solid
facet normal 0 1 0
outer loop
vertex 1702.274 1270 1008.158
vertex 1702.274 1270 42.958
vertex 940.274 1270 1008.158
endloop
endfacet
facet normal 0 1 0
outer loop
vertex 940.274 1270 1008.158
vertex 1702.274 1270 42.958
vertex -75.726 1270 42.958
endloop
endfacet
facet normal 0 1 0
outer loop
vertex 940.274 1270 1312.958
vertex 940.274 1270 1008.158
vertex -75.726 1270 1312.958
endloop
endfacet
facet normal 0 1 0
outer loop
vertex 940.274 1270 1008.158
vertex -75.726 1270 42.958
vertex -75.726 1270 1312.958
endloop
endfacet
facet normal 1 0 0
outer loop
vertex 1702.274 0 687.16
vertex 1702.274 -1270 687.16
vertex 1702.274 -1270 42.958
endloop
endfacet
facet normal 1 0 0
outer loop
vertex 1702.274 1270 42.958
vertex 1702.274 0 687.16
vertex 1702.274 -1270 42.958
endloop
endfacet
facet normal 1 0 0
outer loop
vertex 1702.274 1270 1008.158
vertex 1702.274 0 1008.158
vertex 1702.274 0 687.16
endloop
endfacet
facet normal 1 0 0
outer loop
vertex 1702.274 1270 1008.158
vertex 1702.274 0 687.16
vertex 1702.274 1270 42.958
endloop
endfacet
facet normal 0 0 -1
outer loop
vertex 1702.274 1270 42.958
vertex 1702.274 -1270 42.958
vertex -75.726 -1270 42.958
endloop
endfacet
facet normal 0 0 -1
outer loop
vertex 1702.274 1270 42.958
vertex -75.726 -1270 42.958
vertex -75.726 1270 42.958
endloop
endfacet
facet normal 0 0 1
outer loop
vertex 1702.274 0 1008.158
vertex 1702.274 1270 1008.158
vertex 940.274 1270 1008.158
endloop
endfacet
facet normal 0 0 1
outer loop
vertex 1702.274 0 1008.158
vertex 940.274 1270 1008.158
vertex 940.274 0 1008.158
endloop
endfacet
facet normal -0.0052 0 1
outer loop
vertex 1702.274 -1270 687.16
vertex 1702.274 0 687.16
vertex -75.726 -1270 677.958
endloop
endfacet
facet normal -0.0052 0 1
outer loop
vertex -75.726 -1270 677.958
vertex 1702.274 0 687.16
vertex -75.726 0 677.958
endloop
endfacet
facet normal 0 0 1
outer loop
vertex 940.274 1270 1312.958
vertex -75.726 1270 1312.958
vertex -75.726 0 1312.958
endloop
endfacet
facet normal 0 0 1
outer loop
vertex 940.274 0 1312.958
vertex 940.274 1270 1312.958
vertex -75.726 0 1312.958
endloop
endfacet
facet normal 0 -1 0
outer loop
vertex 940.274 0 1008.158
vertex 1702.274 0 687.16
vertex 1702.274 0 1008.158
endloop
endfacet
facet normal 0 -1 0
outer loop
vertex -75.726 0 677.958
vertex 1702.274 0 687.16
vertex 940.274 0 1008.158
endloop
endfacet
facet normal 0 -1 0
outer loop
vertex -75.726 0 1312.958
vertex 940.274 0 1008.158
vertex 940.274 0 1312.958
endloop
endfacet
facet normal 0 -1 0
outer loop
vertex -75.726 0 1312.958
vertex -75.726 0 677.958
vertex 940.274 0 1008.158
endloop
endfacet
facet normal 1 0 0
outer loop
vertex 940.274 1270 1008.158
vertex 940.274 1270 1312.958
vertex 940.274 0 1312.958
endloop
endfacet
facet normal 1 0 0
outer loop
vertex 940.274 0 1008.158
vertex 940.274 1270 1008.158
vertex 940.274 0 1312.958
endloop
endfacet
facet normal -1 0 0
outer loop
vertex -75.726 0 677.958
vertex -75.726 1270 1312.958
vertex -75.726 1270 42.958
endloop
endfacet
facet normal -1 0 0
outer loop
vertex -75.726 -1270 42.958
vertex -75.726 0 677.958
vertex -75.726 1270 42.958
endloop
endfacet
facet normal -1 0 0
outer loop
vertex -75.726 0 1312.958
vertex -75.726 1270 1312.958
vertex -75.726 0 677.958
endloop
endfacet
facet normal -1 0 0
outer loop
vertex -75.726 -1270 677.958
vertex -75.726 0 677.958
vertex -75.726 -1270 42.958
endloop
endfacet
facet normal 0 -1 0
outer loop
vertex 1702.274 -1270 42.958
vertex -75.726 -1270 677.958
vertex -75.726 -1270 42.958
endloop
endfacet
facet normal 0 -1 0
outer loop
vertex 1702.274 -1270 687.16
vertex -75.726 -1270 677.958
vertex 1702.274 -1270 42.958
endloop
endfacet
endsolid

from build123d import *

# Parameters (mm, degrees)
F1_DEPTH = 1270
F3_DEPTH = 1778
F4_W     = 1270
F4_H     = 304.8
F5_DEPTH = 1016


with BuildPart() as f1:
    # F0 (on Front) → F1 (new body)
    with BuildSketch(Plane.XZ):
        Polygon((1702.274184, 687.159657), (-75.725816, 677.957611), (-75.725816, 42.957611), (1702.274184, 42.957611), align=None)
    extrude(amount=F1_DEPTH)

    # F2 (on face) → F3 (join)
    with BuildSketch(Plane.YZ.offset(1702.274184)):
        Polygon((0, 687.159657), (0, 42.957611), (1270, 42.957611), (1270, 1008.157611), (0, 1008.157611), align=None)
    extrude(amount=-F3_DEPTH)

    # F4 (on face) → F5 (join)
    with BuildSketch(Plane(origin=(-75.725816, 0, 0), x_dir=(0, -1, 0), z_dir=(-1, 0, 0))):
        with Locations((-635, 1160.557611)):
            Rectangle(F4_W, F4_H)
    extrude(amount=-F5_DEPTH)


solid = f1.part
